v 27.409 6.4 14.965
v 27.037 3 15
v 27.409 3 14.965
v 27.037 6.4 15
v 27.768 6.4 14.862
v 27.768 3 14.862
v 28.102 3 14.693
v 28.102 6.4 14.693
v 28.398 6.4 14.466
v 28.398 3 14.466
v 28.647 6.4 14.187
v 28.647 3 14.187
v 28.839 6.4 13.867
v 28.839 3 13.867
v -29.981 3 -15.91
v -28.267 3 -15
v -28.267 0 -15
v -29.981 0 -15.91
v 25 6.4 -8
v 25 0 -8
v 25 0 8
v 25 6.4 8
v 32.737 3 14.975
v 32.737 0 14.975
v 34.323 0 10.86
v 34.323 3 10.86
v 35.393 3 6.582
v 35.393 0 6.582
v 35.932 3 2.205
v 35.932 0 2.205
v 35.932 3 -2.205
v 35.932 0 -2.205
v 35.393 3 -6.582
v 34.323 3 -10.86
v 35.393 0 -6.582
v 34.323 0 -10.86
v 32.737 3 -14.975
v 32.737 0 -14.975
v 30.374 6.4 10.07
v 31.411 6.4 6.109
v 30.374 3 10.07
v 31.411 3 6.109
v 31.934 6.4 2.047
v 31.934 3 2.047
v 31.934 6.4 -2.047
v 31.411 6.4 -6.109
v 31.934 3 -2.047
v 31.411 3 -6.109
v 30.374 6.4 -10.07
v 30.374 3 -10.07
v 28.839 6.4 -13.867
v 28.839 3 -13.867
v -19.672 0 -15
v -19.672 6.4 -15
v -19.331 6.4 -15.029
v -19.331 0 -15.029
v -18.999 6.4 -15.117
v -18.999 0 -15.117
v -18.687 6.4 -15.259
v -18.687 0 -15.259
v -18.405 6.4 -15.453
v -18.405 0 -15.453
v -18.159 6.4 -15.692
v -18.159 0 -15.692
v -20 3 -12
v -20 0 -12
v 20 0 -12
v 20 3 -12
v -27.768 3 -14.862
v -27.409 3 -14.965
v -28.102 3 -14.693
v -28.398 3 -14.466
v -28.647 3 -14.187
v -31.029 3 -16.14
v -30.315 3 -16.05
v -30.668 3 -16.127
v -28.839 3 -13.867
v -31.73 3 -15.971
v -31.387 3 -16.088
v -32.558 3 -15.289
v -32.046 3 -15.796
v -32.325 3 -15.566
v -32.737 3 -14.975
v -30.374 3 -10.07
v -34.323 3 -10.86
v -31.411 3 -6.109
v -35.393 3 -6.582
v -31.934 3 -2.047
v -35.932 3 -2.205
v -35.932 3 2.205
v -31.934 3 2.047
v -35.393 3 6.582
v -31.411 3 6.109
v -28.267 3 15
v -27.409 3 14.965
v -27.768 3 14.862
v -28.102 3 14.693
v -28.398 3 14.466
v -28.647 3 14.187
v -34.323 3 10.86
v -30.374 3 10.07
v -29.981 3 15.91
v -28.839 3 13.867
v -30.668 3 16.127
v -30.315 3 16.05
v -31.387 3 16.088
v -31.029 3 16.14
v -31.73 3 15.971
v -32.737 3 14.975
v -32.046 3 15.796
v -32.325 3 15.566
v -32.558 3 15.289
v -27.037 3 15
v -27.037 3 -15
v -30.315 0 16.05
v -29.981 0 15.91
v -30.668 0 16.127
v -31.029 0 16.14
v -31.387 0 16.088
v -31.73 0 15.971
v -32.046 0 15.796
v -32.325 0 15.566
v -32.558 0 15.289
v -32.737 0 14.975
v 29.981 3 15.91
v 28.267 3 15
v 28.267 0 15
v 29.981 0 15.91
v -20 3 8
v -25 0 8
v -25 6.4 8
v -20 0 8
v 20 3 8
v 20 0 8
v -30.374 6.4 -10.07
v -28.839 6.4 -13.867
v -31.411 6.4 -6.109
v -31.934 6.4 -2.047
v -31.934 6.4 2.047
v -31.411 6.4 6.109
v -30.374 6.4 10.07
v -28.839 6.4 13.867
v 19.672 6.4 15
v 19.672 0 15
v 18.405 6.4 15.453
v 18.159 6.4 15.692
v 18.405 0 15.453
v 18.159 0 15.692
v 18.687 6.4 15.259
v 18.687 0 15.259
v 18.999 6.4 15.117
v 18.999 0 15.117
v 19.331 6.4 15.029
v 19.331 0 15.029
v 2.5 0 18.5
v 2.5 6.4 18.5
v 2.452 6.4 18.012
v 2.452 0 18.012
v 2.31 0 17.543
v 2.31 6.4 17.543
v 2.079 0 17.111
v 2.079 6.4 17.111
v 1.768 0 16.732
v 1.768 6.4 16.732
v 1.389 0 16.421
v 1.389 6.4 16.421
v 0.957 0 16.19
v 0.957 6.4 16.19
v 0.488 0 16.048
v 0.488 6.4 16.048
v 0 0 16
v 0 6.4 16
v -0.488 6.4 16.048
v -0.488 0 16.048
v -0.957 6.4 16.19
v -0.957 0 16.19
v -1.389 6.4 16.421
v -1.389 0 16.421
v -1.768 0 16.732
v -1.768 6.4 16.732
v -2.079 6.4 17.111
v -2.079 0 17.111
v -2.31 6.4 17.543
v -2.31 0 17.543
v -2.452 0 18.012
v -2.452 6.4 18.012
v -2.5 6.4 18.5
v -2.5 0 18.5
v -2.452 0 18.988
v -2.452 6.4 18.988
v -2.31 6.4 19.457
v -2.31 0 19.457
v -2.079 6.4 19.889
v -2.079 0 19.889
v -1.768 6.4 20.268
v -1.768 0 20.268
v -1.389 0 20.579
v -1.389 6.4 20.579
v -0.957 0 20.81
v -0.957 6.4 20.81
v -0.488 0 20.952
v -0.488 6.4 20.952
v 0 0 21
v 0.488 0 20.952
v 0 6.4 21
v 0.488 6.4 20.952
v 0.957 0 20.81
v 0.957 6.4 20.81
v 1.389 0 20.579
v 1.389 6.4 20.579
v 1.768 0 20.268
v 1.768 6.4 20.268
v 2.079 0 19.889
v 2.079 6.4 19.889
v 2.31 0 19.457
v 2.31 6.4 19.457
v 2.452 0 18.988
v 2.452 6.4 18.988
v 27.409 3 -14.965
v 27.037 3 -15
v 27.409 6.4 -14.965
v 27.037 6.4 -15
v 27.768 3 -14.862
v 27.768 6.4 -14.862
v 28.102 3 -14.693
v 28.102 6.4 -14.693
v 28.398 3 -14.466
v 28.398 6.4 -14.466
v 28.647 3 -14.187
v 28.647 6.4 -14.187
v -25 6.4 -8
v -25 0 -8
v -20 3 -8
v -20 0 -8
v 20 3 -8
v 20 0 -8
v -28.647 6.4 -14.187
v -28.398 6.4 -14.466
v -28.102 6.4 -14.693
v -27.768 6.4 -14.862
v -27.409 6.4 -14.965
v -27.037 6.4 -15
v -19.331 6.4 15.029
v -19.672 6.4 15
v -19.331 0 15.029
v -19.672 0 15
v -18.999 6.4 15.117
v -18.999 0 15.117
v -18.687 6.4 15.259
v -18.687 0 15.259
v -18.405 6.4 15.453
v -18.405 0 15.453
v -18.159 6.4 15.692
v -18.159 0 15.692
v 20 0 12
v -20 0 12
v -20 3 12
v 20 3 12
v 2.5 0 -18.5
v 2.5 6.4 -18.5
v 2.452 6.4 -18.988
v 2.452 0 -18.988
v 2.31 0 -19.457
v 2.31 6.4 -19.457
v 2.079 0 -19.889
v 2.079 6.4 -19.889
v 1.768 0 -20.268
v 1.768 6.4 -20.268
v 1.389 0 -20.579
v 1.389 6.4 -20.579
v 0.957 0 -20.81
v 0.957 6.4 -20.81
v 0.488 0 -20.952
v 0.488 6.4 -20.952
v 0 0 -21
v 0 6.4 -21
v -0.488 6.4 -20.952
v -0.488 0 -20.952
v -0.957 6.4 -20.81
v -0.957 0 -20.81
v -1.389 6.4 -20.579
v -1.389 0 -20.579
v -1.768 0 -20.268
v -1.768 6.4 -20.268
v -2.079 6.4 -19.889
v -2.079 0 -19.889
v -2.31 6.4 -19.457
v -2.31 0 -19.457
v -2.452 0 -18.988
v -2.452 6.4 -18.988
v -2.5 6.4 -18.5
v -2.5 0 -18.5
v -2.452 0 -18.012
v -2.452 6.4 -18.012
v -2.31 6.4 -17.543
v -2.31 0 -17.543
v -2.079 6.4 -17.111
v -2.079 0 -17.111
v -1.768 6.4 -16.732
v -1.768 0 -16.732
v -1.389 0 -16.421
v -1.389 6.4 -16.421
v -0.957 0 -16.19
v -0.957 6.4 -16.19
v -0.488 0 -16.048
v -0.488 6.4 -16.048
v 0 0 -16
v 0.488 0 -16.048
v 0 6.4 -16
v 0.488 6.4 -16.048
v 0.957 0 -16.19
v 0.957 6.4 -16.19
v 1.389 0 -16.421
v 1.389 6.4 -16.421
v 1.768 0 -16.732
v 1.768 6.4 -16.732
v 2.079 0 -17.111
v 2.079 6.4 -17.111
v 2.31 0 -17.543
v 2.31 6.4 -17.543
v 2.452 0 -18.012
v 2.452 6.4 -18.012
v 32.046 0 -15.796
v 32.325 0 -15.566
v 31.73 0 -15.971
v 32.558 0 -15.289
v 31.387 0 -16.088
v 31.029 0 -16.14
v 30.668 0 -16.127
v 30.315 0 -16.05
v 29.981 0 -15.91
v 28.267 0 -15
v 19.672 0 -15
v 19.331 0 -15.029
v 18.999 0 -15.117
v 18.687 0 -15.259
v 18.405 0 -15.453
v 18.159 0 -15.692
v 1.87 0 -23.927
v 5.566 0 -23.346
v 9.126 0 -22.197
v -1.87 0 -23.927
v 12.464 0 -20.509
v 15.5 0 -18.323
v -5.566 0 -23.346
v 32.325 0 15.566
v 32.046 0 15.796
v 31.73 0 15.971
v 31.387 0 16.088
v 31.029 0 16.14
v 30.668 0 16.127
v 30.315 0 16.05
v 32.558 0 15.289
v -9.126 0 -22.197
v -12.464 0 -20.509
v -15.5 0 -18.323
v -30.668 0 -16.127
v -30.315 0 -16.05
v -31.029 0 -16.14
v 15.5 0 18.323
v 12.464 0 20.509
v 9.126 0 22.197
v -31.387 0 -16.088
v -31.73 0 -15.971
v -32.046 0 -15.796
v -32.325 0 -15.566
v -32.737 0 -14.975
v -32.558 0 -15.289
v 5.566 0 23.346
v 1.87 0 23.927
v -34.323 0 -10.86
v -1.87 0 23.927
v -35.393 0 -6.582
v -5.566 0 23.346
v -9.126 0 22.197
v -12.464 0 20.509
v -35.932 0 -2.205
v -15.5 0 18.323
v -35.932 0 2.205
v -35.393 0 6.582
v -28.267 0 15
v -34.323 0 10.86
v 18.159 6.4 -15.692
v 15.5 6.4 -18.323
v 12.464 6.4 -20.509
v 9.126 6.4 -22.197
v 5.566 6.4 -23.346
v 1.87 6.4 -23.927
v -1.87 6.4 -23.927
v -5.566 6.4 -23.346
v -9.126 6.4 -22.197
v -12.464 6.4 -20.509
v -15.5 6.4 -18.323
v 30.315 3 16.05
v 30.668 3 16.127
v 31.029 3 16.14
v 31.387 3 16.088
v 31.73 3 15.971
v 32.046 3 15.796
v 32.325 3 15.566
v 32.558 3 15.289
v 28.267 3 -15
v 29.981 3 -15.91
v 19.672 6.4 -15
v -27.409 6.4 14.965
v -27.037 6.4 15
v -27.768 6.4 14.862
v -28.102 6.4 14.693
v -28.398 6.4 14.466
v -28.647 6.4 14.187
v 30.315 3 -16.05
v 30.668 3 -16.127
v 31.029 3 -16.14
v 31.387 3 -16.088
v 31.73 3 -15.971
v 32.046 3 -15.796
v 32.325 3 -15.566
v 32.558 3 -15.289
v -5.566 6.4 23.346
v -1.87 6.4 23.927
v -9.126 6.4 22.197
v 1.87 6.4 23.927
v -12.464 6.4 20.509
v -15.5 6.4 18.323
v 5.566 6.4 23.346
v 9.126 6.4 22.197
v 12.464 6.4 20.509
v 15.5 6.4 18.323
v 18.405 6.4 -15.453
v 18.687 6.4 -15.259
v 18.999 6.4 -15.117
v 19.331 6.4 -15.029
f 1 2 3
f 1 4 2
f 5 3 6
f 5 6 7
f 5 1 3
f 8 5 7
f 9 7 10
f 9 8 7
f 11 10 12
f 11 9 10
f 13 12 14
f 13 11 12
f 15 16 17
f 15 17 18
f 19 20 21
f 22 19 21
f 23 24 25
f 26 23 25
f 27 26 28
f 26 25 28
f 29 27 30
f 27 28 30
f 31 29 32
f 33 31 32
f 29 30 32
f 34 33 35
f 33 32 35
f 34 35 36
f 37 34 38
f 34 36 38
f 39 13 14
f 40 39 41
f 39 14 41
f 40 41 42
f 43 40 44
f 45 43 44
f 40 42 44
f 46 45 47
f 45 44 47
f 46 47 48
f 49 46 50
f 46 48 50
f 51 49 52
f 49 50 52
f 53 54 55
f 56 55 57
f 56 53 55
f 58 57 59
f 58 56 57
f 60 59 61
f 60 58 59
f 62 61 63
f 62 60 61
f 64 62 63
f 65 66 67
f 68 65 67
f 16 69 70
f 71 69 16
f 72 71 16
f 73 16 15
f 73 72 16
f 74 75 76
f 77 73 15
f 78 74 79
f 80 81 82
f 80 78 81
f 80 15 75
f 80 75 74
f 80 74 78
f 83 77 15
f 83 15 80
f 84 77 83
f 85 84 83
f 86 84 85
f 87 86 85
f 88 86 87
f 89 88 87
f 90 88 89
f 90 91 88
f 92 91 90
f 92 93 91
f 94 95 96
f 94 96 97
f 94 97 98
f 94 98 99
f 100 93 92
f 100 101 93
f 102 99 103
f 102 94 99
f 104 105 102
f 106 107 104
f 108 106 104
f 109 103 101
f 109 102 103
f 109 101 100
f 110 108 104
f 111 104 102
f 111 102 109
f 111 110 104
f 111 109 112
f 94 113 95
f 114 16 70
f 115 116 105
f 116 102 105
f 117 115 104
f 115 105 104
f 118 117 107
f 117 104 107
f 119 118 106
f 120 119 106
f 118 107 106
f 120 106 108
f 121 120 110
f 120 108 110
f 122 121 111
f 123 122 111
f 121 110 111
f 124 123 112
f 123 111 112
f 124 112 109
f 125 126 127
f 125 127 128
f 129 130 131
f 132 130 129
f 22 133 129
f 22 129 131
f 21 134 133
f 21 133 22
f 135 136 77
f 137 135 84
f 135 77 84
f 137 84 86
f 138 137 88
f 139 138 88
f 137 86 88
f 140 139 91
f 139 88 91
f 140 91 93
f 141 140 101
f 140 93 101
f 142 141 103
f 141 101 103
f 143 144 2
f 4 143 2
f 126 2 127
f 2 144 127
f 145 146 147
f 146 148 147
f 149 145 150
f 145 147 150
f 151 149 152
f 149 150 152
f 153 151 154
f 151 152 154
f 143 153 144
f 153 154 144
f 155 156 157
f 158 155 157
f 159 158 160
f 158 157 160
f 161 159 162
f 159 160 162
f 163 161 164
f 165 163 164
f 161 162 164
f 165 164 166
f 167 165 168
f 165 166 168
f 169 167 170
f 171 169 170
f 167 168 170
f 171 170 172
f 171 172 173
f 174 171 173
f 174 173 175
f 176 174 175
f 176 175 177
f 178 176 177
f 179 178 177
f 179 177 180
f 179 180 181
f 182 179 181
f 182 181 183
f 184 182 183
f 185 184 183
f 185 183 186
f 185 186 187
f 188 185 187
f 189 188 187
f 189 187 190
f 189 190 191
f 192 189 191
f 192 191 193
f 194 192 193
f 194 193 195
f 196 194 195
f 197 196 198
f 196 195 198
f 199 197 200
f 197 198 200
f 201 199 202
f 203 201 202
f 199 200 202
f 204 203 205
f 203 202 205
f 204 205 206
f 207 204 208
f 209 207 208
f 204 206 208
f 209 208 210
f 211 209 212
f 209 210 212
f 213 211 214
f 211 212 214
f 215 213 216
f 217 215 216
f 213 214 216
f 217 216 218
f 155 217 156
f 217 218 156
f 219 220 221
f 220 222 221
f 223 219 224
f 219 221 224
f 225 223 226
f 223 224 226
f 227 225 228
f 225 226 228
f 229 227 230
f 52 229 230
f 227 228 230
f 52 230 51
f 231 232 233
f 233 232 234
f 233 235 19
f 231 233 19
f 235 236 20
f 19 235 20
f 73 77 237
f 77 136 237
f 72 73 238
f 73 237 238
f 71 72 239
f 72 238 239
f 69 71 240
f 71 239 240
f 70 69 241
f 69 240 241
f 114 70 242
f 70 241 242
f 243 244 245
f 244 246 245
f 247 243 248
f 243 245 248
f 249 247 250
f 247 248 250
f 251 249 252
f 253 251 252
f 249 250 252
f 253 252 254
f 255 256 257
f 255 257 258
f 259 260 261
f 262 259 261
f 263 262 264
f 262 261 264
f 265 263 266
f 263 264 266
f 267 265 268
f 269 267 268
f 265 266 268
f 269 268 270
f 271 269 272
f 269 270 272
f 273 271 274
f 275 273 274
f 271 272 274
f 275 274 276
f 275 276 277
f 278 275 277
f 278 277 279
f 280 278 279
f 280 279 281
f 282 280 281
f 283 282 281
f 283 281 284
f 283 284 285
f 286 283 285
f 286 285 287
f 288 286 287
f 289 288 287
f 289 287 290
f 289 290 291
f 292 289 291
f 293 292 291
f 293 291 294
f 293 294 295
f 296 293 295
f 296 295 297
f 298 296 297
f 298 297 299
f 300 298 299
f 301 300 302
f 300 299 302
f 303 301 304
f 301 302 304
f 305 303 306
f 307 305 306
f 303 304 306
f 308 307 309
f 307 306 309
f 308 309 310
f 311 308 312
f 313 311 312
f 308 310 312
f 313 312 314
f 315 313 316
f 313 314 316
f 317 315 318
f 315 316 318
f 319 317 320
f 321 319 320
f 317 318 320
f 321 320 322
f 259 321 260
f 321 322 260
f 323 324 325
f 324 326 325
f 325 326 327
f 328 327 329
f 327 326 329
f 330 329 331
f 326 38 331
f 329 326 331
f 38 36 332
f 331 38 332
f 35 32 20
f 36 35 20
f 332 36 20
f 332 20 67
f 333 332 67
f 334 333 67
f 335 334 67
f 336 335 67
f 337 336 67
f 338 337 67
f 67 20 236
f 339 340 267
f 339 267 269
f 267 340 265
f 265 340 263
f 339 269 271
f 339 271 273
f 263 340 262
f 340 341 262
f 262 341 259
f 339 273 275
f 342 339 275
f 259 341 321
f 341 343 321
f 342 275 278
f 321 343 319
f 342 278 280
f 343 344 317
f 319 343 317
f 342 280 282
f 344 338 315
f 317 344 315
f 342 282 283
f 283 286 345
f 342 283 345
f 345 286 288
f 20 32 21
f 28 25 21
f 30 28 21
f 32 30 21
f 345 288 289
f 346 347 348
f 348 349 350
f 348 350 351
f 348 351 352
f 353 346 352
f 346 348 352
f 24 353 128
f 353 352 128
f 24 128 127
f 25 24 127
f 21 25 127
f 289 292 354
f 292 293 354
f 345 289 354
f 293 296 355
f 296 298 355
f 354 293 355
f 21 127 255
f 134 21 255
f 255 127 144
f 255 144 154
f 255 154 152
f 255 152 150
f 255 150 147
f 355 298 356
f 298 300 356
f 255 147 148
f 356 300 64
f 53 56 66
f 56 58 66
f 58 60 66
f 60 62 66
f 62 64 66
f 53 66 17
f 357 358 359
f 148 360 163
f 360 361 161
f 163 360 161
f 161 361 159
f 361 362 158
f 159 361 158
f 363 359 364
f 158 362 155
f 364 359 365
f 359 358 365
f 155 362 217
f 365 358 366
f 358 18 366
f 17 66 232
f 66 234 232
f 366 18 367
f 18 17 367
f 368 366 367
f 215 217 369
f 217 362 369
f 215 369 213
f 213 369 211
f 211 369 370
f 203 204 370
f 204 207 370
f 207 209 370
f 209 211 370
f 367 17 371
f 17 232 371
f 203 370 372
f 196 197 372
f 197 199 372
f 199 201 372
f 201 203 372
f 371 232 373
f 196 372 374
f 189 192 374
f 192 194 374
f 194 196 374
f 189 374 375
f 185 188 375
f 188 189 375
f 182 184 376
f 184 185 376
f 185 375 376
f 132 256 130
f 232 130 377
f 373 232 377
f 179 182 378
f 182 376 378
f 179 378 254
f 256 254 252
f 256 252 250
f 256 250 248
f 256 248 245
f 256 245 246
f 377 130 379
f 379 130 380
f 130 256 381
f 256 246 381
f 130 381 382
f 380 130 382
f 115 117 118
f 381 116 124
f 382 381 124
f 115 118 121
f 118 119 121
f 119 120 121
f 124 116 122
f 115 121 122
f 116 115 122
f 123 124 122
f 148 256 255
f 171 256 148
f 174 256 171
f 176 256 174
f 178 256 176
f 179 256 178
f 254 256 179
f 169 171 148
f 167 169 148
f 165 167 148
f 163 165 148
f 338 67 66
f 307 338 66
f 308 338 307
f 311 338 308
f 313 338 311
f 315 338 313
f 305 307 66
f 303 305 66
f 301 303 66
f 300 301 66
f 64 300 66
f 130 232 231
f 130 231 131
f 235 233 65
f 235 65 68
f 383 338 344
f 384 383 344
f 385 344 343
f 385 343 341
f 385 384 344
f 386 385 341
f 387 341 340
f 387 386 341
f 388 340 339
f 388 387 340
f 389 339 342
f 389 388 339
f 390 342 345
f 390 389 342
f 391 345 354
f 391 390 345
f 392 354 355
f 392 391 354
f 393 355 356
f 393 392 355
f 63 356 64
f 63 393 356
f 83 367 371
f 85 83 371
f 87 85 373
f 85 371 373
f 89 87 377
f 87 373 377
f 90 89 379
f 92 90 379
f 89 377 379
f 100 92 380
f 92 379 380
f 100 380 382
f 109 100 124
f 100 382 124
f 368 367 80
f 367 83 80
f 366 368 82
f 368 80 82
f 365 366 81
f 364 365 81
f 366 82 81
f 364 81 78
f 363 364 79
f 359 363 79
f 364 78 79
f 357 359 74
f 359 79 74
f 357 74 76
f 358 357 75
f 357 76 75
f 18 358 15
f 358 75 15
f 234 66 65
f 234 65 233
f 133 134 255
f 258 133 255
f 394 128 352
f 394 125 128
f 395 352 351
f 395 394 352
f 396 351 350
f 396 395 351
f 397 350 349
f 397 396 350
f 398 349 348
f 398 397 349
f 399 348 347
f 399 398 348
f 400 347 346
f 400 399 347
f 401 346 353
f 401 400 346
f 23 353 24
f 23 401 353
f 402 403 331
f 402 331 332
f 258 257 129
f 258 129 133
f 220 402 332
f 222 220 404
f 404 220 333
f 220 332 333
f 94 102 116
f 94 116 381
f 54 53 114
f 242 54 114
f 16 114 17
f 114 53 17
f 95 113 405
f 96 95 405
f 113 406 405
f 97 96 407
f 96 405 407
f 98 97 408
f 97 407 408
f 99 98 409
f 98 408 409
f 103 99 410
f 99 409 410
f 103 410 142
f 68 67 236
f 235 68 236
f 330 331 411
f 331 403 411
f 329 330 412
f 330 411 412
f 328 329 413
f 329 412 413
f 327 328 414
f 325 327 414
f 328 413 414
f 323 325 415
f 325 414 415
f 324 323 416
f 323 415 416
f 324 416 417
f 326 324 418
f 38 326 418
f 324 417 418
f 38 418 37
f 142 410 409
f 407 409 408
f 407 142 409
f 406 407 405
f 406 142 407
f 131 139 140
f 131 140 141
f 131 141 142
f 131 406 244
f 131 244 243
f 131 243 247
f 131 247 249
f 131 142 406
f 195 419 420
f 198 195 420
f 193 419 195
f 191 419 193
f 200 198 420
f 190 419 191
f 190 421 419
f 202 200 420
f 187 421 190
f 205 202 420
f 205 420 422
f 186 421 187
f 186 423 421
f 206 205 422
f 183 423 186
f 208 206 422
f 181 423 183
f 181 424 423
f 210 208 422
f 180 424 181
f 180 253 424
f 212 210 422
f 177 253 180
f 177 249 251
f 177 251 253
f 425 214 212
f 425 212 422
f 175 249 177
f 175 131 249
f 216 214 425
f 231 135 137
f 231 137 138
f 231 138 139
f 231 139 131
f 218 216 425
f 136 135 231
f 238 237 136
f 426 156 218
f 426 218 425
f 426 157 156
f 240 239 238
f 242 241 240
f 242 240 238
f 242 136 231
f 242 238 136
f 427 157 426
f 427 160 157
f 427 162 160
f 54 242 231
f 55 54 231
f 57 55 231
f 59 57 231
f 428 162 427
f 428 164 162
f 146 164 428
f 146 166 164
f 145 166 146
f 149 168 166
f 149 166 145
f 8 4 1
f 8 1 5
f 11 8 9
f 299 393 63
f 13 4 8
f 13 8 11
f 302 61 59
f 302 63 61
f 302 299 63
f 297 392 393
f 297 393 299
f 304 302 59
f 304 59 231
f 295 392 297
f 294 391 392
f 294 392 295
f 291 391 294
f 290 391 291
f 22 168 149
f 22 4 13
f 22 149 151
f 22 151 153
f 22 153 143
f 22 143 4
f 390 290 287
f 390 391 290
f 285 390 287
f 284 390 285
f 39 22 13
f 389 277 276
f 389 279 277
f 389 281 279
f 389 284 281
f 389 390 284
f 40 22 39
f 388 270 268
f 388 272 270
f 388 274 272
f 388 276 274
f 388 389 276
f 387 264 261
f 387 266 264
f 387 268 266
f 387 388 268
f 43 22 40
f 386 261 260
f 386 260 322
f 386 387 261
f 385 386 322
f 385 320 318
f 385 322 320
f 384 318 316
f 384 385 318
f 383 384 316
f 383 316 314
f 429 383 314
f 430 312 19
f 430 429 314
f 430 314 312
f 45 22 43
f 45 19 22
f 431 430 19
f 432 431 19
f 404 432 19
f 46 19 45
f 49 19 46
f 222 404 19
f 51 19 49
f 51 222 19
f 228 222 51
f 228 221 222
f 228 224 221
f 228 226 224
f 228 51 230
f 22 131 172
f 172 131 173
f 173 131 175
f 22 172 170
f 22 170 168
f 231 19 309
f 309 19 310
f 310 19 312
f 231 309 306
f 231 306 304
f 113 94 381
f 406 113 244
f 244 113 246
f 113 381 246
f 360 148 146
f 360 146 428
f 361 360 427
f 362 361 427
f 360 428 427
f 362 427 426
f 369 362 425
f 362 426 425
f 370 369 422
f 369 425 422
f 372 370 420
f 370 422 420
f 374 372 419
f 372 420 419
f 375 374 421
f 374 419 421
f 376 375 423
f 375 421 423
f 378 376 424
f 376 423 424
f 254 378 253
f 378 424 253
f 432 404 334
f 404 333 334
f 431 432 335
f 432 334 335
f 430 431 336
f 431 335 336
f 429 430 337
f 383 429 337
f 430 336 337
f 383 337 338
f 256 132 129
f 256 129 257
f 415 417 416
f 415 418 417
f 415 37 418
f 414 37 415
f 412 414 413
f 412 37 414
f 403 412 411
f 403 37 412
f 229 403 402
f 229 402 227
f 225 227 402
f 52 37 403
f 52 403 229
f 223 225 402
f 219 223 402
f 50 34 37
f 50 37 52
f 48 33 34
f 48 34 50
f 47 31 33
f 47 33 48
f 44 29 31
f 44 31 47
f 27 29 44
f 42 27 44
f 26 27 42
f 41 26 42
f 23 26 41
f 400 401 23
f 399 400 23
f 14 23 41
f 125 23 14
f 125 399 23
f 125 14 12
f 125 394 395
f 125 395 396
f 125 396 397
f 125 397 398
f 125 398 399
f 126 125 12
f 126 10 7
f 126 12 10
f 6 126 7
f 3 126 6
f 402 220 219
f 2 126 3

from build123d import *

# Parameters (mm, degrees)
SKETCH1_W           = 40
SKETCH1_H           = 16
BOSS_EXTRUDE1_DEPTH = 6.4
SKETCH2_W           = 40
SKETCH2_H           = 4
CUT_EXTRUDE1_DEPTH  = 3
SKETCH3_W           = 5
SKETCH3_H           = 16
CUT_EXTRUDE2_DEPTH  = 7.4
BOSS_EXTRUDE2_DEPTH = 6.4
BOSS_EXTRUDE3_DEPTH = 3
FILLET1_R           = 2
SKETCH7_R           = 2.5
CUT_EXTRUDE3_DEPTH  = 7.4


with BuildPart() as part:
    # Sketch1 → Boss-Extrude1 (new body)
    with BuildSketch(Plane(origin=(0, 0, 0), x_dir=(1, 0, 0), z_dir=(0, 1, 0))):
        with BuildLine():
            Line((28.26658805, 15), (-28.26658805, 15))
            ThreePointArc((-28.26658805, 15), (-32, 0), (-28.26658805, -15))
            Line((-28.26658805, -15), (28.26658805, -15))
            ThreePointArc((28.26658805, -15), (32, 0), (28.26658805, 15))
        make_face()
        Rectangle(SKETCH1_W, SKETCH1_H, mode=Mode.SUBTRACT)
    extrude(amount=BOSS_EXTRUDE1_DEPTH)

    # Sketch2 → Cut-Extrude1 (cut)
    with BuildSketch(Plane.XZ):
        with Locations((0, 10)):
            Rectangle(SKETCH2_W, SKETCH2_H)
        with Locations((0, -10)):
            Rectangle(SKETCH2_W, SKETCH2_H)
    extrude(amount=-CUT_EXTRUDE1_DEPTH, mode=Mode.SUBTRACT)

    # Sketch3 → Cut-Extrude2 (cut, through all)
    with BuildSketch(Plane.XZ):
        with Locations((-22.5, 0)):
            Rectangle(SKETCH3_W, SKETCH3_H)
        with Locations((22.5, 0)):
            Rectangle(SKETCH3_W, SKETCH3_H)
    extrude(amount=-CUT_EXTRUDE2_DEPTH, mode=Mode.SUBTRACT)

    # Sketch5 → Boss-Extrude2 (add)
    with BuildSketch(Plane(origin=(0, 6.4, 0), x_dir=(1, 0, 0), z_dir=(0, 1, 0))):
        with BuildLine():
            Line((-18.734993995, -15), (18.734993995, -15))
            ThreePointArc((18.734993995, -15), (0, -24), (-18.734993995, -15))
        make_face()
        with BuildLine():
            Line((-18.734993995, 15), (18.734993995, 15))
            ThreePointArc((18.734993995, 15), (0, 24), (-18.734993995, 15))
        make_face()
    extrude(amount=-BOSS_EXTRUDE2_DEPTH)

    # Sketch6 → Boss-Extrude3 (add)
    with BuildSketch(Plane.XZ):
        with BuildLine():
            Line((-31.799911556, 16.875), (-28.26658805, 15))
            ThreePointArc((-28.26658805, 15), (-32, 0), (-28.26658805, -15))
            Line((-28.26658805, -15), (-31.799911556, -16.875))
            ThreePointArc((-31.799911556, -16.875), (-36, 0), (-31.799911556, 16.875))
        make_face()
        with BuildLine():
            ThreePointArc((31.799911556, 16.875), (36, 0), (31.799911556, -16.875))
            Line((31.799911556, -16.875), (28.26658805, -15))
            ThreePointArc((28.26658805, -15), (32, 0), (28.26658805, 15))
            Line((28.26658805, 15), (31.799911556, 16.875))
        make_face()
    extrude(amount=-BOSS_EXTRUDE3_DEPTH)

    # Fillet1
    fillet1_edges = [part.edges().sort_by_distance(p)[0] for p in [
        (-31.799911556, 1.5, 16.875),
        (-31.799911556, 1.5, -16.875),
        (31.799911556, 1.5, 16.875),
        (31.799911556, 1.5, -16.875),
        (28.26658805, 4.7, 15),
        (-28.26658805, 4.7, 15),
        (-28.26658805, 4.7, -15),
        (28.26658805, 4.7, -15),
        (-18.734993995, 3.2, 15),
        (18.734993995, 3.2, 15),
        (18.734993995, 3.2, -15),
        (-18.734993995, 3.2, -15),
    ]]
    fillet(fillet1_edges, radius=FILLET1_R)

    # Sketch7 → Cut-Extrude3 (cut, through all)
    with BuildSketch(Plane(origin=(0, 6.4, 0), x_dir=(1, 0, 0), z_dir=(0, 1, 0))):
        with Locations((0, 18.5)):
            Circle(SKETCH7_R)
        with Locations((0, -18.5)):
            Circle(SKETCH7_R)
    extrude(amount=-CUT_EXTRUDE3_DEPTH, mode=Mode.SUBTRACT)


solid = part.part
